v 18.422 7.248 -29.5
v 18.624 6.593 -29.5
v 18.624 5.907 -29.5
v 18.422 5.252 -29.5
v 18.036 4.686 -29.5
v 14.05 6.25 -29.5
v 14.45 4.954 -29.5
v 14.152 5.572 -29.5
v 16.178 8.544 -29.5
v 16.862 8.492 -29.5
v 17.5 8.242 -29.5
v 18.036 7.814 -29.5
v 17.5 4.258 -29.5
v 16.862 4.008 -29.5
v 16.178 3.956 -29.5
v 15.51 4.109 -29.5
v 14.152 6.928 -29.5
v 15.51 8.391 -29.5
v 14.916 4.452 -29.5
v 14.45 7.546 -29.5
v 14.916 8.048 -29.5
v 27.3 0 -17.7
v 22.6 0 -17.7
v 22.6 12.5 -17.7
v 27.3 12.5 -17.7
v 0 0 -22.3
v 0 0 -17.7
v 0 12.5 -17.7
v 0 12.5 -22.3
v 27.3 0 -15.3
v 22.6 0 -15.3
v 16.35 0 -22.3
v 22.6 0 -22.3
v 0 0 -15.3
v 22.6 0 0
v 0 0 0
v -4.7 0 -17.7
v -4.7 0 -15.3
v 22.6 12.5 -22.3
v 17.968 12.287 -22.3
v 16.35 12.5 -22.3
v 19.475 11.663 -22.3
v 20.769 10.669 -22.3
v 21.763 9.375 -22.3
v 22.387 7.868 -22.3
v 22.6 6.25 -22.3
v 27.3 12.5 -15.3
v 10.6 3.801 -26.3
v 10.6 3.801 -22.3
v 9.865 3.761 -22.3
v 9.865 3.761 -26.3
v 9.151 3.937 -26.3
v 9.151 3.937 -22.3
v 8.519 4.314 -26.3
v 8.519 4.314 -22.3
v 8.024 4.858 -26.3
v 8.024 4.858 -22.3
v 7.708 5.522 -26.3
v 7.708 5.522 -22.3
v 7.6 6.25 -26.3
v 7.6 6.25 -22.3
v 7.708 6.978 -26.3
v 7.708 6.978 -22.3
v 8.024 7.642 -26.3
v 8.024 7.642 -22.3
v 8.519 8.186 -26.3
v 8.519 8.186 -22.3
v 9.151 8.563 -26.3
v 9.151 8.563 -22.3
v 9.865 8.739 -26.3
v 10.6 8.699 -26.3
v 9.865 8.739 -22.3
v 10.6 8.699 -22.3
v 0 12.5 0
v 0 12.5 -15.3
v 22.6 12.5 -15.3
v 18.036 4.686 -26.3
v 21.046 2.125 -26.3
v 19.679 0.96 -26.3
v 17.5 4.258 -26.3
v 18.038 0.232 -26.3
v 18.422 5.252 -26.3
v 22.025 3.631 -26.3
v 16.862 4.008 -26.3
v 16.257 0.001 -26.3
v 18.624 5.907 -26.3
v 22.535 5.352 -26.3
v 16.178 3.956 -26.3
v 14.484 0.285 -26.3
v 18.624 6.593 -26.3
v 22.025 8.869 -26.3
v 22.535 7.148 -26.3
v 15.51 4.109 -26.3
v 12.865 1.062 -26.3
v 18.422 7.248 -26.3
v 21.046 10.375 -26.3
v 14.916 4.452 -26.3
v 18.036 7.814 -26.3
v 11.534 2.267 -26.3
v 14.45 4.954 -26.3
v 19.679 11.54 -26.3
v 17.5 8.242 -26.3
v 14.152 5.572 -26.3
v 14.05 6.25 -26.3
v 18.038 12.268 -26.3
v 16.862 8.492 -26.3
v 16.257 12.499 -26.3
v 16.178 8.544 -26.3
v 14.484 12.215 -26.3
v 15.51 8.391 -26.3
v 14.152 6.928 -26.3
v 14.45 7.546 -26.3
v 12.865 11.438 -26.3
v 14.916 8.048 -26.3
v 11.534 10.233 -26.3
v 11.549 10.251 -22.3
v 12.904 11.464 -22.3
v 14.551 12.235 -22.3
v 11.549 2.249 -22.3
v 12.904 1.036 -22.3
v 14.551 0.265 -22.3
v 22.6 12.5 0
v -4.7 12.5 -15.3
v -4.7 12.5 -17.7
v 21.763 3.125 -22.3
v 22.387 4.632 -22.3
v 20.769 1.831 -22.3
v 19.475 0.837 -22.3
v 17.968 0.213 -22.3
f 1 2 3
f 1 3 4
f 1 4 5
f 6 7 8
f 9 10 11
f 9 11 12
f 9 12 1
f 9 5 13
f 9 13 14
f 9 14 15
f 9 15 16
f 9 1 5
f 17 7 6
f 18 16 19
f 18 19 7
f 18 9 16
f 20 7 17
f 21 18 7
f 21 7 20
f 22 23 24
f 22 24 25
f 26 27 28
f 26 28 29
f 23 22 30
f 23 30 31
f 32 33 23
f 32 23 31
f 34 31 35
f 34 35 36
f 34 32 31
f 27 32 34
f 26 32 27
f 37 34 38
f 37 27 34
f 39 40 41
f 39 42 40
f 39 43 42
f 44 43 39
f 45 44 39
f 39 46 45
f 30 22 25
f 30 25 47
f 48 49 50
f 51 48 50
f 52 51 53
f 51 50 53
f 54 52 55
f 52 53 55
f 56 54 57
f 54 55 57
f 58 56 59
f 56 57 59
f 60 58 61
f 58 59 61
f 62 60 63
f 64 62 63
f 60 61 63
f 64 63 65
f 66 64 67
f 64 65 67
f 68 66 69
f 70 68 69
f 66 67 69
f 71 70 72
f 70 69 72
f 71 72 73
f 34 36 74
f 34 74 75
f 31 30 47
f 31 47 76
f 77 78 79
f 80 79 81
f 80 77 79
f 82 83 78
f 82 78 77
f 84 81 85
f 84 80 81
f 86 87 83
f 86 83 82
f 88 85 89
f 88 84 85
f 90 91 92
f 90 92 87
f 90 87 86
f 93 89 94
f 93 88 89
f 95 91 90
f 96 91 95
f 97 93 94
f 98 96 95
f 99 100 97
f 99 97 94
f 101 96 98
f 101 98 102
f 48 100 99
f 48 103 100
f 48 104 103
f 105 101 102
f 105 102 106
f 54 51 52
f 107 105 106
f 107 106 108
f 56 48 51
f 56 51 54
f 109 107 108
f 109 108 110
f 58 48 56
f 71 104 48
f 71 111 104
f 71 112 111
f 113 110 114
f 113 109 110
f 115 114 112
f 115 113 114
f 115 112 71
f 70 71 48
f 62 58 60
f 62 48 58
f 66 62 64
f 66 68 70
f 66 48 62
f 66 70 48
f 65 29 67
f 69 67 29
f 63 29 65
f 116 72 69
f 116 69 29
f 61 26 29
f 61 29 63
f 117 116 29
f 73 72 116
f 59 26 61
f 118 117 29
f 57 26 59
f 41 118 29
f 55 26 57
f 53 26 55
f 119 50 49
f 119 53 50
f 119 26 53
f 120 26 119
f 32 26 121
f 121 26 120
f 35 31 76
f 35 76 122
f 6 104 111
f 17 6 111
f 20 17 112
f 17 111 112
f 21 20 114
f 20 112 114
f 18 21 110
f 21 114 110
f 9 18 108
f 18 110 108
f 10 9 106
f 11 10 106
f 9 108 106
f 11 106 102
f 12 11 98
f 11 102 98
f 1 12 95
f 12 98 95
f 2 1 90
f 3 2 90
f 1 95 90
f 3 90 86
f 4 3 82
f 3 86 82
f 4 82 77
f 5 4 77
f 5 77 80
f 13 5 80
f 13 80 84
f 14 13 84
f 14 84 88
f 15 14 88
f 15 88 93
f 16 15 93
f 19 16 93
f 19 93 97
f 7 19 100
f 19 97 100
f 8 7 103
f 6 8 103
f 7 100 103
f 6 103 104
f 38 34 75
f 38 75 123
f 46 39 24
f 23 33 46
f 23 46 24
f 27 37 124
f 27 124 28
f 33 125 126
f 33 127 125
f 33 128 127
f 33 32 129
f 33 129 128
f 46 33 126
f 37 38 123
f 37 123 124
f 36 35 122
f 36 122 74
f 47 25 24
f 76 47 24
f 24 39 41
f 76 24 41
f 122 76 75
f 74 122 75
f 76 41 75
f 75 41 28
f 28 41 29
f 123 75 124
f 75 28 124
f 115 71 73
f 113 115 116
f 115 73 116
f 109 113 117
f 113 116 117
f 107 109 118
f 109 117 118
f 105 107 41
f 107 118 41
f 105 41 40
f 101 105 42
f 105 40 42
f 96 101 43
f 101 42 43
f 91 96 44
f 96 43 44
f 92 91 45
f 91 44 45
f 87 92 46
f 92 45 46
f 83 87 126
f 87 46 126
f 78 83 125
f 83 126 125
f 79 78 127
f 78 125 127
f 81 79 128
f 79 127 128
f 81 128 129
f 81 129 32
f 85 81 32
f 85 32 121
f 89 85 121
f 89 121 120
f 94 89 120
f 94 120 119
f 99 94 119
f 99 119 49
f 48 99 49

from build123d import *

# Parameters (mm, degrees)
BOSS_EXTRUDE1_DEPTH = 12.5
BOSS_EXTRUDE2_DEPTH = 4
SKETCH3_R           = 2.3
BOSS_EXTRUDE3_DEPTH = 3.2


with BuildPart() as part:
    # Sketch1 → Boss-Extrude1 (new body)
    with BuildSketch(Plane(origin=(0, 0, 0), x_dir=(1, 0, 0), z_dir=(0, 1, 0))):
        Polygon((0, 17.7), (0, 22.3), (22.6, 22.3), (22.6, 17.7), (27.3, 17.7), (27.3, 15.3), (22.6, 15.3), (22.6, 0), (0, 0), (0, 15.3), (-4.7, 15.3), (-4.7, 17.7), align=None)
    extrude(amount=BOSS_EXTRUDE1_DEPTH)

    # Sketch2 → Boss-Extrude2 (add)
    with BuildSketch(Plane(origin=(0, 0, -22.3), x_dir=(-1, 0, 0), z_dir=(0, 0, -1))):
        with BuildLine():
            ThreePointArc((-10.6, 8.699489743), (-22.6, 6.25), (-10.6, 3.800510257))
            ThreePointArc((-10.6, 3.800510257), (-7.6, 6.25), (-10.6, 8.699489743))
        make_face()
    extrude(amount=BOSS_EXTRUDE2_DEPTH)

    # Sketch3 → Boss-Extrude3 (add)
    with BuildSketch(Plane(origin=(0, 0, -26.3), x_dir=(-1, 0, 0), z_dir=(0, 0, -1))):
        with Locations((-16.35, 6.25)):
            Circle(SKETCH3_R)
    extrude(amount=BOSS_EXTRUDE3_DEPTH)


solid = part.part
